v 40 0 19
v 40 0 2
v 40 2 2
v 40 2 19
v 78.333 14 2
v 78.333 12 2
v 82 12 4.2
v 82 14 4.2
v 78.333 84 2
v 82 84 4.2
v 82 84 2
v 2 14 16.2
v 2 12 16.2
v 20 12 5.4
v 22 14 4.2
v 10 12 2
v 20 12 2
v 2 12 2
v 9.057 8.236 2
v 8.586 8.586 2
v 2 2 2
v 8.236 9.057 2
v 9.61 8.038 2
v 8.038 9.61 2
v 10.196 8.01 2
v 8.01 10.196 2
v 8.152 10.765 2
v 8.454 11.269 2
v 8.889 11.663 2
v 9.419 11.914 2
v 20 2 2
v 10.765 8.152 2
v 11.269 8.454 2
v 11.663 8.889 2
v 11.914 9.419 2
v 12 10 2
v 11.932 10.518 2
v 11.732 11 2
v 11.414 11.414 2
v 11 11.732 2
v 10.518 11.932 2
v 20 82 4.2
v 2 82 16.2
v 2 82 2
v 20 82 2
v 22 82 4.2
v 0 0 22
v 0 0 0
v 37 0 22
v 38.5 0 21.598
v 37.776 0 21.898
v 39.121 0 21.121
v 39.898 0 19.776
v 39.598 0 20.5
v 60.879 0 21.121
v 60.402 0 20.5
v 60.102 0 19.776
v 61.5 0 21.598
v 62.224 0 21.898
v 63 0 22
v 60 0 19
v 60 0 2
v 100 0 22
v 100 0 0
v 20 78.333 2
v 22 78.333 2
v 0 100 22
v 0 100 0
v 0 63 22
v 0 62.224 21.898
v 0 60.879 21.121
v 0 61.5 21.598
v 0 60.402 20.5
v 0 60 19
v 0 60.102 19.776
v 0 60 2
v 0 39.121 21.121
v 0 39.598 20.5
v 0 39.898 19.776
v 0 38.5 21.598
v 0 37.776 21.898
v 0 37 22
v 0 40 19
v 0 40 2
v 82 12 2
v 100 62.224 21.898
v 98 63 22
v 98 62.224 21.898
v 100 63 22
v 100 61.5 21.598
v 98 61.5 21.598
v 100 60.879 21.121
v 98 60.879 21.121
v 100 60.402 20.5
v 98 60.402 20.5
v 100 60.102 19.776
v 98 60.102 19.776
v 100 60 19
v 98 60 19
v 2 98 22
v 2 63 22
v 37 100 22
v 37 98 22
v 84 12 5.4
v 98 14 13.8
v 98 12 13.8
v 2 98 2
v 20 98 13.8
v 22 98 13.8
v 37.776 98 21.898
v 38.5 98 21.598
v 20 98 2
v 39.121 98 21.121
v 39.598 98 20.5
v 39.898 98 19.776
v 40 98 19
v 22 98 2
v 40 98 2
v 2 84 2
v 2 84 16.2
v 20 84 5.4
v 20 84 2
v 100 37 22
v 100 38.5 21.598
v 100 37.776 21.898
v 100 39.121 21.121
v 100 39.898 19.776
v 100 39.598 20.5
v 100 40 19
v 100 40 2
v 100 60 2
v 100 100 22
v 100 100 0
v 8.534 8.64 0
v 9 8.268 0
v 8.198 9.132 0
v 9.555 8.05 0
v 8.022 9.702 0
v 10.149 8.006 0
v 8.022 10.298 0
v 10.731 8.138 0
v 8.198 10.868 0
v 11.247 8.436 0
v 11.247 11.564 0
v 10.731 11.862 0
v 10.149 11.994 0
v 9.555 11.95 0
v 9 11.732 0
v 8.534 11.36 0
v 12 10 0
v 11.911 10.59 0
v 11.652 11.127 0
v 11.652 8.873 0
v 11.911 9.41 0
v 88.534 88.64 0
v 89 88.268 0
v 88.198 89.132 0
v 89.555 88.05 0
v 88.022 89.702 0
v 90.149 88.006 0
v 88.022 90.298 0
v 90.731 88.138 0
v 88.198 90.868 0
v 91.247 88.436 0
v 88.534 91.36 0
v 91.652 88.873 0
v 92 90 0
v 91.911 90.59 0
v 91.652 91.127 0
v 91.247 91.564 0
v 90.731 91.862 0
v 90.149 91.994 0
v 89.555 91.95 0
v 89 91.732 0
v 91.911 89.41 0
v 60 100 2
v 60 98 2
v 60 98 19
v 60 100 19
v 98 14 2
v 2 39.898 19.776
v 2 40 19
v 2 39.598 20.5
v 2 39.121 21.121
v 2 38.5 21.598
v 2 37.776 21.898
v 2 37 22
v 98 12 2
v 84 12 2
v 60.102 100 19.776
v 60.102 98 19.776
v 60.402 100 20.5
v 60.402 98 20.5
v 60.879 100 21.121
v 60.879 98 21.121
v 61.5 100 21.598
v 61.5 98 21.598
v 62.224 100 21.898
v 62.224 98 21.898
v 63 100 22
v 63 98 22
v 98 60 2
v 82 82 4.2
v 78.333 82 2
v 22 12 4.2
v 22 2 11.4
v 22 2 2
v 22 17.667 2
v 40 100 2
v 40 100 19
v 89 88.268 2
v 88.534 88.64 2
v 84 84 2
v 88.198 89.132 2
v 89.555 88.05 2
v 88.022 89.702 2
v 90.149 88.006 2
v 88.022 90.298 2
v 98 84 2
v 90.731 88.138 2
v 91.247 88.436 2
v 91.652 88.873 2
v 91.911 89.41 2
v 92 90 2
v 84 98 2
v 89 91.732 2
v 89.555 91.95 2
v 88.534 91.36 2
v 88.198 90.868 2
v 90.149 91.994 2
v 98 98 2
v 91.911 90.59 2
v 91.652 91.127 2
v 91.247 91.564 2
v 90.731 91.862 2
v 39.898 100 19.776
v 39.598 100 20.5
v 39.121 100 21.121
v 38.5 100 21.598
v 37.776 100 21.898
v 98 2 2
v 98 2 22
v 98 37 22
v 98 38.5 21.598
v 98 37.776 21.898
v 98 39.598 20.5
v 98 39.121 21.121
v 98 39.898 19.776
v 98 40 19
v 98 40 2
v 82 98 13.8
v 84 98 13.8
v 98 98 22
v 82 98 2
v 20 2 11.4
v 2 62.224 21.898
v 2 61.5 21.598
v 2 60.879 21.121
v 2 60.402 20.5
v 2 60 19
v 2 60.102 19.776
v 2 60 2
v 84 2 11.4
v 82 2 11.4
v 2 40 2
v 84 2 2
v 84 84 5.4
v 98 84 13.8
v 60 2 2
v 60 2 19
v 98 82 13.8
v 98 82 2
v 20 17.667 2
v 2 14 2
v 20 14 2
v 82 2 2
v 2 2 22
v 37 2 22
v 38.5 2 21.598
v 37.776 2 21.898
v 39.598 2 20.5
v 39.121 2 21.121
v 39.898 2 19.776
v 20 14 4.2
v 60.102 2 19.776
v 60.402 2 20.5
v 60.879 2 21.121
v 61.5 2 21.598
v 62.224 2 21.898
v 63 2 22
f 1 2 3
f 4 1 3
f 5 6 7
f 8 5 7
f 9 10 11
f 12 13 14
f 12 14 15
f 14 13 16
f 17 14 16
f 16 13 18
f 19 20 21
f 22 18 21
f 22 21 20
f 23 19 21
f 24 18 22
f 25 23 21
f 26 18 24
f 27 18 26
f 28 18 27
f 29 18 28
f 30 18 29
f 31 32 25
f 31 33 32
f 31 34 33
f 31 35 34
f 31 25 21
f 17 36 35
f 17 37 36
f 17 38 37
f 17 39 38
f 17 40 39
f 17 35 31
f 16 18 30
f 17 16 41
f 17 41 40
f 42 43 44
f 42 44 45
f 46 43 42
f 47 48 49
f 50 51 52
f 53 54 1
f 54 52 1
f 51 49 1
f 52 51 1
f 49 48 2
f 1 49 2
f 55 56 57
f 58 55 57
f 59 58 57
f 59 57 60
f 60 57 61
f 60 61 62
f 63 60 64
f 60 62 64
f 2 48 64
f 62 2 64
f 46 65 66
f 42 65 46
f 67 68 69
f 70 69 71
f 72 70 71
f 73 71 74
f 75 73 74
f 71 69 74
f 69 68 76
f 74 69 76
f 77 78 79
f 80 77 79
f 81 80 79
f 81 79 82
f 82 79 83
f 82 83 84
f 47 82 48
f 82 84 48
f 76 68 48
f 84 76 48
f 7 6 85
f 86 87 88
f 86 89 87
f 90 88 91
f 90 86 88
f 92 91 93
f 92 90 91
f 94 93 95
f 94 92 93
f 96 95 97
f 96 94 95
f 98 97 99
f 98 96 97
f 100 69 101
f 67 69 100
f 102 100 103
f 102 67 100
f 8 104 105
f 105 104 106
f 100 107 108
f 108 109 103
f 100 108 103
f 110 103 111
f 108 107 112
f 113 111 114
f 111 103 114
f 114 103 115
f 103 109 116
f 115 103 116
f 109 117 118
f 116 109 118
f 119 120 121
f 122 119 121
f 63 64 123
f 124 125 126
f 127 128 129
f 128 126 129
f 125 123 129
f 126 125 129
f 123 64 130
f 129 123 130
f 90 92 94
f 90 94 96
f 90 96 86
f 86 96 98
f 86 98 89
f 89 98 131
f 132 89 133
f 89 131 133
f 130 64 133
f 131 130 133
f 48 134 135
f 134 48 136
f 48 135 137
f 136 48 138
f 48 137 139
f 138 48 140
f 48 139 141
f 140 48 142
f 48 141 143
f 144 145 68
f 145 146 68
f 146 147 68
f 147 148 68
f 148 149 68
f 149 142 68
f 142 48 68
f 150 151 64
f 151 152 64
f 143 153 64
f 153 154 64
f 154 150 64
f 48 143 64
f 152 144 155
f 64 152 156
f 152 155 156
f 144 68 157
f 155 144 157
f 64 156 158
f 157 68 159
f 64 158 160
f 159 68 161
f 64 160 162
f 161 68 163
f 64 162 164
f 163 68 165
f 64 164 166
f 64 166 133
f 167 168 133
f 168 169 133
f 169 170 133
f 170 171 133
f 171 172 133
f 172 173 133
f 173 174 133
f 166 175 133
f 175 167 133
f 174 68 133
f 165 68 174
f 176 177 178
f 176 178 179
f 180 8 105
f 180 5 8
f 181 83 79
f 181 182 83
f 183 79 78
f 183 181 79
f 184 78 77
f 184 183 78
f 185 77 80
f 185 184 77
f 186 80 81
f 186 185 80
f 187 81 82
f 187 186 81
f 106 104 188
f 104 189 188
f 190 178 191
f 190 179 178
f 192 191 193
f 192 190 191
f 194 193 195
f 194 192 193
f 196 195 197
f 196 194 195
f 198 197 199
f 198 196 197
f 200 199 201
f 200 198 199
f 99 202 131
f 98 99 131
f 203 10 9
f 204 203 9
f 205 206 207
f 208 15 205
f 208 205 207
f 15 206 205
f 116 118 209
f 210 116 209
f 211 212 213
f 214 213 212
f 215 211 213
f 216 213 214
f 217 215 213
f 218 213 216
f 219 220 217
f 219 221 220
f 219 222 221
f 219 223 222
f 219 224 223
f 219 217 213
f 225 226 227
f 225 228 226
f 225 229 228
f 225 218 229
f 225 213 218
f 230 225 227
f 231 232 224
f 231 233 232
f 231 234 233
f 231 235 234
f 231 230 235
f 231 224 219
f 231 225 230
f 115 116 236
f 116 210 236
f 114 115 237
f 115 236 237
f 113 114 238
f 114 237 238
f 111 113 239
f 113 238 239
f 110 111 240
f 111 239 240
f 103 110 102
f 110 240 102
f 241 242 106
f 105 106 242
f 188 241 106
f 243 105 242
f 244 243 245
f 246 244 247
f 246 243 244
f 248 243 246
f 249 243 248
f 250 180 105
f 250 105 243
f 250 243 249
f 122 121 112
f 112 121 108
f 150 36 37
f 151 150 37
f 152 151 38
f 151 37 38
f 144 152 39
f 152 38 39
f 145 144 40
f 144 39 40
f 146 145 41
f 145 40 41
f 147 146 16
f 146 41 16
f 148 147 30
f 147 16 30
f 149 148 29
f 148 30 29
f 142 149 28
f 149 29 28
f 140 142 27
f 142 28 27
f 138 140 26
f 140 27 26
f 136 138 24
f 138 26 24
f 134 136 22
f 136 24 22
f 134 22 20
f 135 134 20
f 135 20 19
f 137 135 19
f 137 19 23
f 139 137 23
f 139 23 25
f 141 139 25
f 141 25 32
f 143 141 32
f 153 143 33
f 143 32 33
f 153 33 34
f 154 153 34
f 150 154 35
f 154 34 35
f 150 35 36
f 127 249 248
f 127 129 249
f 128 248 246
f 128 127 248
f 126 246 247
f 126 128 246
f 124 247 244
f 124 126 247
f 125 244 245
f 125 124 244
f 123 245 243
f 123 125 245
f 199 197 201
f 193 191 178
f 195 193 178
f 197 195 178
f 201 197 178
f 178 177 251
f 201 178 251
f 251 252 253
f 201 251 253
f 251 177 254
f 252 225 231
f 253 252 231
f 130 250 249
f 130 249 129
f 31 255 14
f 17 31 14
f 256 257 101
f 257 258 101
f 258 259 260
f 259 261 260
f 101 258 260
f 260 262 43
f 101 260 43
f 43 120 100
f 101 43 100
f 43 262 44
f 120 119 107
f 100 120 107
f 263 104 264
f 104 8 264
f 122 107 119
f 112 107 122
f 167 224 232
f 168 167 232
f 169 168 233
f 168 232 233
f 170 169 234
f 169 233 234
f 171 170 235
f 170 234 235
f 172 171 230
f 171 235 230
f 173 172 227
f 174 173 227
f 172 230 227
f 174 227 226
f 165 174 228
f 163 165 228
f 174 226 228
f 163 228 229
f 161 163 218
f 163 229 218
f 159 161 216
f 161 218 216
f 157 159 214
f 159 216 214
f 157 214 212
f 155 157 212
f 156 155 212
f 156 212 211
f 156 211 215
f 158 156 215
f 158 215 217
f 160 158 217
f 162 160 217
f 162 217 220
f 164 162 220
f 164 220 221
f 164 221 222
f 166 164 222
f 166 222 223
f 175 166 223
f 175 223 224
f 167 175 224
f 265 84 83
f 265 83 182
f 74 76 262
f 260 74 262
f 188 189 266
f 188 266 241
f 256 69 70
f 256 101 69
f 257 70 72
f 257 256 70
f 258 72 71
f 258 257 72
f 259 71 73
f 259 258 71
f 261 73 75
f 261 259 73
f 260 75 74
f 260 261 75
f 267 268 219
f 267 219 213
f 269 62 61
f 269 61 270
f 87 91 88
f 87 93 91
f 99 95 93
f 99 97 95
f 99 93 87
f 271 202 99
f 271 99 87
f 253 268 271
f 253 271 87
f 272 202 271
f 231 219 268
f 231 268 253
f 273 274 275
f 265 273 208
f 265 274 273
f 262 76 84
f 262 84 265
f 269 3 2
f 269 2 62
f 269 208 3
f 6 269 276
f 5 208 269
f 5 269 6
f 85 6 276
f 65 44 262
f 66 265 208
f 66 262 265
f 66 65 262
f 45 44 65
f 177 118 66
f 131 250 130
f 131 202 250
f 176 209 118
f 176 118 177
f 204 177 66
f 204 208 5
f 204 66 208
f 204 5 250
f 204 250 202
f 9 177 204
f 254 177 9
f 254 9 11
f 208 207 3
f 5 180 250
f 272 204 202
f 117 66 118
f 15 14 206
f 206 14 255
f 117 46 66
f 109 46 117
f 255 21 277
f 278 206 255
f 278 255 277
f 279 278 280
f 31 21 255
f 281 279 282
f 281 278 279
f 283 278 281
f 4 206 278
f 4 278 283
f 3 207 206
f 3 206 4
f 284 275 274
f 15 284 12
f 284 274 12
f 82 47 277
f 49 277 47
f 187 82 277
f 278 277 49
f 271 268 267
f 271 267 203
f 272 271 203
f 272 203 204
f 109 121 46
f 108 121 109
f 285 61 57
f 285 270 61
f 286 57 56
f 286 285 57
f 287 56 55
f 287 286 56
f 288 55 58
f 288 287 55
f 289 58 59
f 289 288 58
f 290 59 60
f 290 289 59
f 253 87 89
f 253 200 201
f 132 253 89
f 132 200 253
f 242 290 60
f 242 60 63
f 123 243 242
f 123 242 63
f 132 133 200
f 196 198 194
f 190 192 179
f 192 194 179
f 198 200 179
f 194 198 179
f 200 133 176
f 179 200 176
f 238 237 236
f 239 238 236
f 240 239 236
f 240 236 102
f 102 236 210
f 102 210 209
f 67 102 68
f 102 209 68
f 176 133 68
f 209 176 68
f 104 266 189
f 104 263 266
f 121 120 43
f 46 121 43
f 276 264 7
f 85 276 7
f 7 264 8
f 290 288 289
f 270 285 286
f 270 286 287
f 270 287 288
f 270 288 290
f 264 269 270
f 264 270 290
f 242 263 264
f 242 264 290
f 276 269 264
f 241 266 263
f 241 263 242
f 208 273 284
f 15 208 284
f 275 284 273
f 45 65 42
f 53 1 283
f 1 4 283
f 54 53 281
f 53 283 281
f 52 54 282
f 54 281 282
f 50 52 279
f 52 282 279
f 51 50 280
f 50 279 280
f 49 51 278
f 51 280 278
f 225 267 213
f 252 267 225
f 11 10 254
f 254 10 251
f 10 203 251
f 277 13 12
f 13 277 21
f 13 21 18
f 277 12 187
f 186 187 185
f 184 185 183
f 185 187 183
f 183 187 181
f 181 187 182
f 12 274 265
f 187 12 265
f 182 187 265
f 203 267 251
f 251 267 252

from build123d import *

# Parameters (mm, degrees)
SKETCH_1_W          = 100
SKETCH_1_H          = 100
EXTRUDE_1_DEPTH     = 2
SKETCH_2_W          = 2
SKETCH_2_H          = 2
SKETCH_2_W_2        = 38
SKETCH_2_H_2        = 38
EXTRUDE_2_DEPTH     = 20
SKETCH_3_W          = 38
SKETCH_3_H          = 2
SKETCH_3_W_2        = 2
SKETCH_3_H_2        = 38
SKETCH_3_H_3        = 40
SKETCH_3_W_3        = 40
EXTRUDE_3_DEPTH     = 20
RIB_2_REACH         = 133.807
SKETCH_7_WALL_W     = 294.768112702
SKETCH_7_WALL_H     = 2
FILLET_1_R          = 3
RIB_3_REACH         = 133.807
SKETCH_8_WALL_W     = 294.768112702
SKETCH_8_WALL_H     = 2
MIRROR_START        = 20
MIRROR_3_DEPTH      = 2
MIRROR_START_2      = 82
MIRROR_3_2_DEPTH    = 2
MIRROR_START_3      = 2
MIRROR_3_3_DEPTH    = 18
MIRROR_START_4      = 84
MIRROR_3_4_DEPTH    = 14
MIRROR_START_5      = 12
MIRROR_3_5_DEPTH    = 2
SKETCH_10_R         = 2
CUT_EXTRUDE_1_DEPTH = 20
SKETCH_11_R         = 2
CUT_EXTRUDE_2_DEPTH = 20


with BuildPart() as part:
    # 草图1 → 凸台-拉伸1 (new body)
    with BuildSketch(Plane.XY):
        with Locations((50, 50)):
            Rectangle(SKETCH_1_W, SKETCH_1_H)
    extrude(amount=EXTRUDE_1_DEPTH)

    # 草图2 → 凸台-拉伸2 (add)
    with BuildSketch(Plane.XY.offset(2)):
        with Locations((1, 99)):
            Rectangle(SKETCH_2_W, SKETCH_2_H)
        with Locations((21, 99)):
            Rectangle(SKETCH_2_W_2, SKETCH_2_H)
        with Locations((1, 79)):
            Rectangle(SKETCH_2_W, SKETCH_2_H_2)
        with Locations((1, 21)):
            Rectangle(SKETCH_2_W, SKETCH_2_H_2)
        with Locations((1, 1)):
            Rectangle(SKETCH_2_W, SKETCH_2_H)
        with Locations((21, 1)):
            Rectangle(SKETCH_2_W_2, SKETCH_2_H)
    extrude(amount=EXTRUDE_2_DEPTH)

    # 草图3 → 凸台-拉伸3 (add)
    with BuildSketch(Plane.XY.offset(2)):
        with Locations((79, 99)):
            Rectangle(SKETCH_3_W, SKETCH_3_H)
        with Locations((99, 99)):
            Rectangle(SKETCH_3_W_2, SKETCH_3_H)
        with Locations((99, 79)):
            Rectangle(SKETCH_3_W_2, SKETCH_3_H_2)
        with Locations((99, 20)):
            Rectangle(SKETCH_3_W_2, SKETCH_3_H_3)
        with Locations((80, 1)):
            Rectangle(SKETCH_3_W_3, SKETCH_3_H)
    extrude(amount=EXTRUDE_3_DEPTH)

    # 草图7 wall → 筋2 (add, up to next)
    with BuildSketch(Plane(origin=(87.5, 83, 7.5), x_dir=(-0.857492925713, 0, -0.514495755428), z_dir=(0.514495755428, 0, -0.857492925713)), mode=Mode.PRIVATE) as rib_2_sk1:
        Rectangle(SKETCH_7_WALL_W, SKETCH_7_WALL_H)
    rib_2_tool1 = extrude(rib_2_sk1.sketch, amount=RIB_2_REACH, mode=Mode.PRIVATE) - part.part
    rib_2 = rib_2_tool1.solids().sort_by_distance((87.5, 83, 7.5))[0]
    add(rib_2)

    # 圆角1
    fillet_1_edges = [part.edges().sort_by_distance(p)[0] for p in [
        (40, 1, 22),
        (1, 40, 22),
        (1, 60, 22),
        (40, 99, 22),
        (99, 60, 22),
        (60, 99, 22),
        (99, 40, 22),
        (60, 1, 22),
    ]]
    fillet(fillet_1_edges, radius=FILLET_1_R)

    # 草图8 wall → 筋3 (add, up to next)
    with BuildSketch(Plane(origin=(83, 87.5, 7.5), x_dir=(0, 0.857492925713, 0.514495755428), z_dir=(0, 0.514495755428, -0.857492925713)), mode=Mode.PRIVATE) as rib_3_sk1:
        Rectangle(SKETCH_8_WALL_W, SKETCH_8_WALL_H)
    rib_3_tool1 = extrude(rib_3_sk1.sketch, amount=RIB_3_REACH, mode=Mode.PRIVATE) - part.part
    rib_3 = rib_3_tool1.solids().sort_by_distance((83, 87.5, 7.5))[0]
    add(rib_3)

    # 镜向1: 筋3 mirrored; each copy of 筋3 runs up to whatever stops it at its own place
    mirror_1_before = part.part  # the part as the pattern finds it: every copy runs up to it
    mirror_1_rib_3_long = extrude(rib_3_sk1.sketch, amount=RIB_3_REACH, mode=Mode.PRIVATE)
    mirror_1_rib_3_tool1 = mirror_1_rib_3_long.mirror(Plane(origin=(52, 0, 0), x_dir=(0, 0, 1), z_dir=(1, 0, 0))) - mirror_1_before
    add(mirror_1_rib_3_tool1.solids().sort_by_distance((21, 87.5, 7.5))[0])

    # 镜向2: 筋2 mirrored; each copy of 筋2 runs up to whatever stops it at its own place
    mirror_2_before = part.part  # the part as the pattern finds it: every copy runs up to it
    mirror_2_rib_2_long = extrude(rib_2_sk1.sketch, amount=RIB_2_REACH, mode=Mode.PRIVATE)
    mirror_2_rib_2_tool1 = mirror_2_rib_2_long.mirror(Plane(origin=(52, 0, 0), x_dir=(0, 0, 1), z_dir=(1, 0, 0))) - mirror_2_before
    add(mirror_2_rib_2_tool1.solids().sort_by_distance((16.5, 83, 7.5))[0])

    # 镜向3: read off the stored shape, not the designer's step
    # 镜向3 outline → 镜向3 (add)
    with BuildSketch(Plane.YZ.offset(MIRROR_START)):
        Polygon((17.666666667, 2), (14, 4.2), (2, 11.4), (2, 2), align=None)
    extrude(amount=MIRROR_3_DEPTH)

    # Mirror 3 2 outline → Mirror 3 2 (add)
    with BuildSketch(Plane.YZ.offset(MIRROR_START_2)):
        Polygon((14, 2), (14, 4.2), (2, 11.4), (2, 2), align=None)
    extrude(amount=MIRROR_3_2_DEPTH)

    # Mirror 3 3 outline → Mirror 3 3 (add)
    with BuildSketch(Plane.YZ.offset(MIRROR_START_3)):
        Polygon((14, 2), (14, 4.2), (12, 5.4), (12, 2), align=None)
    extrude(amount=MIRROR_3_3_DEPTH)

    # Mirror 3 4 outline → Mirror 3 4 (add)
    with BuildSketch(Plane.YZ.offset(MIRROR_START_4)):
        Polygon((14, 2), (14, 4.2), (12, 5.4), (12, 2), align=None)
    extrude(amount=MIRROR_3_4_DEPTH)

    # Mirror 3 5 outline → Mirror 3 5 (add)
    with BuildSketch(Plane(origin=(0, 0, 0), x_dir=(1, 0, 0), z_dir=(0, 1, 0)).offset(MIRROR_START_5)):
        Polygon((98, -13.8), (98, -2), (78.333333333, -2), align=None)
        Polygon((2, -16.2), (22, -4.2), (20, -4.2), (20, -2), (2, -2), align=None)
    extrude(amount=MIRROR_3_5_DEPTH)

    # 草图10 → 切除-拉伸1 (cut)
    with BuildSketch(Plane.XY.offset(2)):
        with Locations((90, 90)):
            Circle(SKETCH_10_R)
    extrude(amount=-CUT_EXTRUDE_1_DEPTH, mode=Mode.SUBTRACT)

    # 草图11 → 切除-拉伸2 (cut)
    with BuildSketch(Plane.XY.offset(2)):
        with Locations((10, 10)):
            Circle(SKETCH_11_R)
    extrude(amount=-CUT_EXTRUDE_2_DEPTH, mode=Mode.SUBTRACT)


solid = part.part
